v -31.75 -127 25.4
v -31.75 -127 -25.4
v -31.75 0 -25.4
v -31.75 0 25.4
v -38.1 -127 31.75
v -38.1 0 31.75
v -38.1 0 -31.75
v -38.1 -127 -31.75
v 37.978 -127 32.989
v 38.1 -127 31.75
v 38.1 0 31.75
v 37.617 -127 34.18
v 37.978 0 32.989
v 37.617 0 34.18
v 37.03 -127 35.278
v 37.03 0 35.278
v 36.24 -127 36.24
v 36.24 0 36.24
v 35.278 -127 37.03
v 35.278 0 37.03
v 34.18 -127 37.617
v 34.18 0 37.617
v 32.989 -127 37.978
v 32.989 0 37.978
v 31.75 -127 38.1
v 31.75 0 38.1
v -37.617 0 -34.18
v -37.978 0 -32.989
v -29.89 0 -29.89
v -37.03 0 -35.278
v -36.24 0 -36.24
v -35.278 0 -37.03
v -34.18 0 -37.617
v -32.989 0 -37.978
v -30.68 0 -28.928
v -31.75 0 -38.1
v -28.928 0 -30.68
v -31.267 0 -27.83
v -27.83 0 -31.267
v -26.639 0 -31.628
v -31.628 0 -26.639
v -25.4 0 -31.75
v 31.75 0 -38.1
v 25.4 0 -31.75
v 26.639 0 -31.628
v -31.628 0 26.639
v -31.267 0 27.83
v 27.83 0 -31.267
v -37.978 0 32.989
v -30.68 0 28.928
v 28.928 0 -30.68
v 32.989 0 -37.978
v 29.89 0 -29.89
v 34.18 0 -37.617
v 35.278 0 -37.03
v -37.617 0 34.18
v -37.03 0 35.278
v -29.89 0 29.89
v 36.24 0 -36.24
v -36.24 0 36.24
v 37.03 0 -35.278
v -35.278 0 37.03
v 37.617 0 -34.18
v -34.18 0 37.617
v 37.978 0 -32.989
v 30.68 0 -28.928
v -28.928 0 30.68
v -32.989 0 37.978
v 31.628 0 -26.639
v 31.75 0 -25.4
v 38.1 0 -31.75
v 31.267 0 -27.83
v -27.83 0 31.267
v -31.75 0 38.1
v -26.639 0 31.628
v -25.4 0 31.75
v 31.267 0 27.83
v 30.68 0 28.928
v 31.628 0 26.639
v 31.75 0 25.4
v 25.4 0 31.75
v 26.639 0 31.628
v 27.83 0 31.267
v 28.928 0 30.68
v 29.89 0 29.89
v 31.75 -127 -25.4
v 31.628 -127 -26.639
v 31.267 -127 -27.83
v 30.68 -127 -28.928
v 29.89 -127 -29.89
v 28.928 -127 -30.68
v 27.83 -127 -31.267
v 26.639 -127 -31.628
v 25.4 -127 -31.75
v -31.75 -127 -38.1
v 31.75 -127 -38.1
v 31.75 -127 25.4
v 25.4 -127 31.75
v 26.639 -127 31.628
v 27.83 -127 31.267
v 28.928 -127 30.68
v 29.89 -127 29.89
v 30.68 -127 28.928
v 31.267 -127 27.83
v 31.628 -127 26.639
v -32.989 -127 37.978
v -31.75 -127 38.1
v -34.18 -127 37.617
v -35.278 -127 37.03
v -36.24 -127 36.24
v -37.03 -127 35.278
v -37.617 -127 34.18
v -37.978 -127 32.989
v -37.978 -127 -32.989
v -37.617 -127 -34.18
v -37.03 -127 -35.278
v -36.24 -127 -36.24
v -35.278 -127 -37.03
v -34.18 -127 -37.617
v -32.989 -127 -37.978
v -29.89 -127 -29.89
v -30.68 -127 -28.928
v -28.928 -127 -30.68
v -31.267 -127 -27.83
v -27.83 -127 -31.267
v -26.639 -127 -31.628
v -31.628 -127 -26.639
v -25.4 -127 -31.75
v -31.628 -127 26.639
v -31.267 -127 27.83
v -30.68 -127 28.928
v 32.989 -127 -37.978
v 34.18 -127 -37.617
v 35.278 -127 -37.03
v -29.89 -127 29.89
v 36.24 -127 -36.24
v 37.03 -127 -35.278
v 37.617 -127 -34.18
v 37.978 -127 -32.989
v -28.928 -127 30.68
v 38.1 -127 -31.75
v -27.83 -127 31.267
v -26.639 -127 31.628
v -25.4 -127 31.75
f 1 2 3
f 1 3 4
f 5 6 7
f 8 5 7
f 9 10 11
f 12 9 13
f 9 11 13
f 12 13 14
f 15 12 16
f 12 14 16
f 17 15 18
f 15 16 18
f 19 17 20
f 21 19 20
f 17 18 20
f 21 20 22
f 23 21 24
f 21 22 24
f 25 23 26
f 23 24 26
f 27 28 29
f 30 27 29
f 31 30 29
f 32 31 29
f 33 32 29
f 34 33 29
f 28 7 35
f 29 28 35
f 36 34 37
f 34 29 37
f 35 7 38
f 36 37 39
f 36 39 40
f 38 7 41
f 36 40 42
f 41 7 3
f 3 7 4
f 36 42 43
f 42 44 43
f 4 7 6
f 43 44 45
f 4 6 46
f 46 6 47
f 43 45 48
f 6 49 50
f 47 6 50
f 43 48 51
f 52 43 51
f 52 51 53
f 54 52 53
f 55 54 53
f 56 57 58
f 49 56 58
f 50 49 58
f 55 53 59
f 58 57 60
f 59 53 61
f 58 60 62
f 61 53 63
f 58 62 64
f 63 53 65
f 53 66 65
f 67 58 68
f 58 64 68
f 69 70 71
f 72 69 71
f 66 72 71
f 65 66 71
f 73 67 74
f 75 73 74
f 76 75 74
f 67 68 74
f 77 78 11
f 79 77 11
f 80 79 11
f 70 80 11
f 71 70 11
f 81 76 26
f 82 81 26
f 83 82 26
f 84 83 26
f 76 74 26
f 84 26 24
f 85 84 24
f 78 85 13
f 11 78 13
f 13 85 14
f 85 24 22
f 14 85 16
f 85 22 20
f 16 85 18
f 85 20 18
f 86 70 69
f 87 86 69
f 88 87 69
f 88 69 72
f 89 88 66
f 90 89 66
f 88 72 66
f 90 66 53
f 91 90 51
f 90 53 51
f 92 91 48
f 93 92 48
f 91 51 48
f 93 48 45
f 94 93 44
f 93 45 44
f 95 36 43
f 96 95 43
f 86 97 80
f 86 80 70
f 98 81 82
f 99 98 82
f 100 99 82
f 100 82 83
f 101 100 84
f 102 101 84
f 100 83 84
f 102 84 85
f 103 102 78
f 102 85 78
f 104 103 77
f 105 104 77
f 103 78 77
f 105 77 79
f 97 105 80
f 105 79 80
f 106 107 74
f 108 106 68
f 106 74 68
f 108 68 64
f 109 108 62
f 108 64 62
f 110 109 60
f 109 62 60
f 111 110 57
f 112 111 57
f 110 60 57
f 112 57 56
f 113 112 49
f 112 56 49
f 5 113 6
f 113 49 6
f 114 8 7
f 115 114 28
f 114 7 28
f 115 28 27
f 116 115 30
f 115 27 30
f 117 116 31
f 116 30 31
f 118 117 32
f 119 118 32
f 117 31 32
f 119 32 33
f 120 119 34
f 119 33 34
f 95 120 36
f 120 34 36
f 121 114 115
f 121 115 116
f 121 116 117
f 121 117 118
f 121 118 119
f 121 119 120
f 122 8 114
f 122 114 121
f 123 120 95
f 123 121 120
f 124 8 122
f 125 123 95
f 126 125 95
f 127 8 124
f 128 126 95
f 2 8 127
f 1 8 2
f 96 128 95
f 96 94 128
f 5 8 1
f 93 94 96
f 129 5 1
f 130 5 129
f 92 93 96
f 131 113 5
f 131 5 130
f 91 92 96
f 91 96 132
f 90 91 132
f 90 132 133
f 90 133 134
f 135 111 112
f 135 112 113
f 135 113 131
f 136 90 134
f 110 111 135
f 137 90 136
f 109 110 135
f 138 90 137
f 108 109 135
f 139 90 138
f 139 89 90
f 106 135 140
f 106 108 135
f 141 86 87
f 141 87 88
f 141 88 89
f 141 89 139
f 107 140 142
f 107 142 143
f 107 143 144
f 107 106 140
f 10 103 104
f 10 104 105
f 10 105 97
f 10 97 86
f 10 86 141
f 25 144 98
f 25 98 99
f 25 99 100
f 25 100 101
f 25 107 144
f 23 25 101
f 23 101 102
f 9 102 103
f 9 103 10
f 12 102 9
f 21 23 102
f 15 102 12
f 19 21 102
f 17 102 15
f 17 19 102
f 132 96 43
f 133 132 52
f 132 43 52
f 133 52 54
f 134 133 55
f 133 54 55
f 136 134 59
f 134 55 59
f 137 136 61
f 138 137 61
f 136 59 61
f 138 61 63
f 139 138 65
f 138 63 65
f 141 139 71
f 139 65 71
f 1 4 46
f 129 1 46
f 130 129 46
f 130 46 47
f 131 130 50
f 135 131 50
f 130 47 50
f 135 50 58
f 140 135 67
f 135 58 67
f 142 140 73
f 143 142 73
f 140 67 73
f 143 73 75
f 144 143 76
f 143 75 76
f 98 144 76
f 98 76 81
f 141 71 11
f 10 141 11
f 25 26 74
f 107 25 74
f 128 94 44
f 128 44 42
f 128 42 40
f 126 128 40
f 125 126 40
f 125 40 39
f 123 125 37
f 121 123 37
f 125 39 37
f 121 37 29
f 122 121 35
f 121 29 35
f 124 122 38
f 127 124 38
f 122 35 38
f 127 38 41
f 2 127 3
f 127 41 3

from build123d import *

# Parameters (mm, degrees)
F1_DEPTH = 127


with BuildPart() as f1:
    # F0 (on Front) → F1 (new body)
    with BuildSketch(Plane.XZ):
        with BuildLine():
            ThreePointArc((38.1, 31.75), (36.240128, 36.240128), (31.75, 38.1))
            Line((31.75, 38.1), (-31.75, 38.1))
            ThreePointArc((-31.75, 38.1), (-36.240128, 36.240128), (-38.1, 31.75))
            Line((-38.1, 31.75), (-38.1, -31.75))
            ThreePointArc((-38.1, -31.75), (-36.240128, -36.240128), (-31.75, -38.1))
            Line((-31.75, -38.1), (31.75, -38.1))
            ThreePointArc((31.75, -38.1), (36.240128, -36.240128), (38.1, -31.75))
            Line((38.1, -31.75), (38.1, 31.75))
        make_face()
        with BuildLine():
            Line((-31.75, -25.4), (-31.75, 25.4))
            ThreePointArc((-31.75, 25.4), (-29.890128, 29.890128), (-25.4, 31.75))
            Line((-25.4, 31.75), (25.4, 31.75))
            ThreePointArc((25.4, 31.75), (29.890128, 29.890128), (31.75, 25.4))
            Line((31.75, 25.4), (31.75, -25.4))
            ThreePointArc((31.75, -25.4), (29.890128, -29.890128), (25.4, -31.75))
            Line((25.4, -31.75), (-25.4, -31.75))
            ThreePointArc((-25.4, -31.75), (-29.890128, -29.890128), (-31.75, -25.4))
        make_face(mode=Mode.SUBTRACT)
    extrude(amount=F1_DEPTH)


solid = f1.part
